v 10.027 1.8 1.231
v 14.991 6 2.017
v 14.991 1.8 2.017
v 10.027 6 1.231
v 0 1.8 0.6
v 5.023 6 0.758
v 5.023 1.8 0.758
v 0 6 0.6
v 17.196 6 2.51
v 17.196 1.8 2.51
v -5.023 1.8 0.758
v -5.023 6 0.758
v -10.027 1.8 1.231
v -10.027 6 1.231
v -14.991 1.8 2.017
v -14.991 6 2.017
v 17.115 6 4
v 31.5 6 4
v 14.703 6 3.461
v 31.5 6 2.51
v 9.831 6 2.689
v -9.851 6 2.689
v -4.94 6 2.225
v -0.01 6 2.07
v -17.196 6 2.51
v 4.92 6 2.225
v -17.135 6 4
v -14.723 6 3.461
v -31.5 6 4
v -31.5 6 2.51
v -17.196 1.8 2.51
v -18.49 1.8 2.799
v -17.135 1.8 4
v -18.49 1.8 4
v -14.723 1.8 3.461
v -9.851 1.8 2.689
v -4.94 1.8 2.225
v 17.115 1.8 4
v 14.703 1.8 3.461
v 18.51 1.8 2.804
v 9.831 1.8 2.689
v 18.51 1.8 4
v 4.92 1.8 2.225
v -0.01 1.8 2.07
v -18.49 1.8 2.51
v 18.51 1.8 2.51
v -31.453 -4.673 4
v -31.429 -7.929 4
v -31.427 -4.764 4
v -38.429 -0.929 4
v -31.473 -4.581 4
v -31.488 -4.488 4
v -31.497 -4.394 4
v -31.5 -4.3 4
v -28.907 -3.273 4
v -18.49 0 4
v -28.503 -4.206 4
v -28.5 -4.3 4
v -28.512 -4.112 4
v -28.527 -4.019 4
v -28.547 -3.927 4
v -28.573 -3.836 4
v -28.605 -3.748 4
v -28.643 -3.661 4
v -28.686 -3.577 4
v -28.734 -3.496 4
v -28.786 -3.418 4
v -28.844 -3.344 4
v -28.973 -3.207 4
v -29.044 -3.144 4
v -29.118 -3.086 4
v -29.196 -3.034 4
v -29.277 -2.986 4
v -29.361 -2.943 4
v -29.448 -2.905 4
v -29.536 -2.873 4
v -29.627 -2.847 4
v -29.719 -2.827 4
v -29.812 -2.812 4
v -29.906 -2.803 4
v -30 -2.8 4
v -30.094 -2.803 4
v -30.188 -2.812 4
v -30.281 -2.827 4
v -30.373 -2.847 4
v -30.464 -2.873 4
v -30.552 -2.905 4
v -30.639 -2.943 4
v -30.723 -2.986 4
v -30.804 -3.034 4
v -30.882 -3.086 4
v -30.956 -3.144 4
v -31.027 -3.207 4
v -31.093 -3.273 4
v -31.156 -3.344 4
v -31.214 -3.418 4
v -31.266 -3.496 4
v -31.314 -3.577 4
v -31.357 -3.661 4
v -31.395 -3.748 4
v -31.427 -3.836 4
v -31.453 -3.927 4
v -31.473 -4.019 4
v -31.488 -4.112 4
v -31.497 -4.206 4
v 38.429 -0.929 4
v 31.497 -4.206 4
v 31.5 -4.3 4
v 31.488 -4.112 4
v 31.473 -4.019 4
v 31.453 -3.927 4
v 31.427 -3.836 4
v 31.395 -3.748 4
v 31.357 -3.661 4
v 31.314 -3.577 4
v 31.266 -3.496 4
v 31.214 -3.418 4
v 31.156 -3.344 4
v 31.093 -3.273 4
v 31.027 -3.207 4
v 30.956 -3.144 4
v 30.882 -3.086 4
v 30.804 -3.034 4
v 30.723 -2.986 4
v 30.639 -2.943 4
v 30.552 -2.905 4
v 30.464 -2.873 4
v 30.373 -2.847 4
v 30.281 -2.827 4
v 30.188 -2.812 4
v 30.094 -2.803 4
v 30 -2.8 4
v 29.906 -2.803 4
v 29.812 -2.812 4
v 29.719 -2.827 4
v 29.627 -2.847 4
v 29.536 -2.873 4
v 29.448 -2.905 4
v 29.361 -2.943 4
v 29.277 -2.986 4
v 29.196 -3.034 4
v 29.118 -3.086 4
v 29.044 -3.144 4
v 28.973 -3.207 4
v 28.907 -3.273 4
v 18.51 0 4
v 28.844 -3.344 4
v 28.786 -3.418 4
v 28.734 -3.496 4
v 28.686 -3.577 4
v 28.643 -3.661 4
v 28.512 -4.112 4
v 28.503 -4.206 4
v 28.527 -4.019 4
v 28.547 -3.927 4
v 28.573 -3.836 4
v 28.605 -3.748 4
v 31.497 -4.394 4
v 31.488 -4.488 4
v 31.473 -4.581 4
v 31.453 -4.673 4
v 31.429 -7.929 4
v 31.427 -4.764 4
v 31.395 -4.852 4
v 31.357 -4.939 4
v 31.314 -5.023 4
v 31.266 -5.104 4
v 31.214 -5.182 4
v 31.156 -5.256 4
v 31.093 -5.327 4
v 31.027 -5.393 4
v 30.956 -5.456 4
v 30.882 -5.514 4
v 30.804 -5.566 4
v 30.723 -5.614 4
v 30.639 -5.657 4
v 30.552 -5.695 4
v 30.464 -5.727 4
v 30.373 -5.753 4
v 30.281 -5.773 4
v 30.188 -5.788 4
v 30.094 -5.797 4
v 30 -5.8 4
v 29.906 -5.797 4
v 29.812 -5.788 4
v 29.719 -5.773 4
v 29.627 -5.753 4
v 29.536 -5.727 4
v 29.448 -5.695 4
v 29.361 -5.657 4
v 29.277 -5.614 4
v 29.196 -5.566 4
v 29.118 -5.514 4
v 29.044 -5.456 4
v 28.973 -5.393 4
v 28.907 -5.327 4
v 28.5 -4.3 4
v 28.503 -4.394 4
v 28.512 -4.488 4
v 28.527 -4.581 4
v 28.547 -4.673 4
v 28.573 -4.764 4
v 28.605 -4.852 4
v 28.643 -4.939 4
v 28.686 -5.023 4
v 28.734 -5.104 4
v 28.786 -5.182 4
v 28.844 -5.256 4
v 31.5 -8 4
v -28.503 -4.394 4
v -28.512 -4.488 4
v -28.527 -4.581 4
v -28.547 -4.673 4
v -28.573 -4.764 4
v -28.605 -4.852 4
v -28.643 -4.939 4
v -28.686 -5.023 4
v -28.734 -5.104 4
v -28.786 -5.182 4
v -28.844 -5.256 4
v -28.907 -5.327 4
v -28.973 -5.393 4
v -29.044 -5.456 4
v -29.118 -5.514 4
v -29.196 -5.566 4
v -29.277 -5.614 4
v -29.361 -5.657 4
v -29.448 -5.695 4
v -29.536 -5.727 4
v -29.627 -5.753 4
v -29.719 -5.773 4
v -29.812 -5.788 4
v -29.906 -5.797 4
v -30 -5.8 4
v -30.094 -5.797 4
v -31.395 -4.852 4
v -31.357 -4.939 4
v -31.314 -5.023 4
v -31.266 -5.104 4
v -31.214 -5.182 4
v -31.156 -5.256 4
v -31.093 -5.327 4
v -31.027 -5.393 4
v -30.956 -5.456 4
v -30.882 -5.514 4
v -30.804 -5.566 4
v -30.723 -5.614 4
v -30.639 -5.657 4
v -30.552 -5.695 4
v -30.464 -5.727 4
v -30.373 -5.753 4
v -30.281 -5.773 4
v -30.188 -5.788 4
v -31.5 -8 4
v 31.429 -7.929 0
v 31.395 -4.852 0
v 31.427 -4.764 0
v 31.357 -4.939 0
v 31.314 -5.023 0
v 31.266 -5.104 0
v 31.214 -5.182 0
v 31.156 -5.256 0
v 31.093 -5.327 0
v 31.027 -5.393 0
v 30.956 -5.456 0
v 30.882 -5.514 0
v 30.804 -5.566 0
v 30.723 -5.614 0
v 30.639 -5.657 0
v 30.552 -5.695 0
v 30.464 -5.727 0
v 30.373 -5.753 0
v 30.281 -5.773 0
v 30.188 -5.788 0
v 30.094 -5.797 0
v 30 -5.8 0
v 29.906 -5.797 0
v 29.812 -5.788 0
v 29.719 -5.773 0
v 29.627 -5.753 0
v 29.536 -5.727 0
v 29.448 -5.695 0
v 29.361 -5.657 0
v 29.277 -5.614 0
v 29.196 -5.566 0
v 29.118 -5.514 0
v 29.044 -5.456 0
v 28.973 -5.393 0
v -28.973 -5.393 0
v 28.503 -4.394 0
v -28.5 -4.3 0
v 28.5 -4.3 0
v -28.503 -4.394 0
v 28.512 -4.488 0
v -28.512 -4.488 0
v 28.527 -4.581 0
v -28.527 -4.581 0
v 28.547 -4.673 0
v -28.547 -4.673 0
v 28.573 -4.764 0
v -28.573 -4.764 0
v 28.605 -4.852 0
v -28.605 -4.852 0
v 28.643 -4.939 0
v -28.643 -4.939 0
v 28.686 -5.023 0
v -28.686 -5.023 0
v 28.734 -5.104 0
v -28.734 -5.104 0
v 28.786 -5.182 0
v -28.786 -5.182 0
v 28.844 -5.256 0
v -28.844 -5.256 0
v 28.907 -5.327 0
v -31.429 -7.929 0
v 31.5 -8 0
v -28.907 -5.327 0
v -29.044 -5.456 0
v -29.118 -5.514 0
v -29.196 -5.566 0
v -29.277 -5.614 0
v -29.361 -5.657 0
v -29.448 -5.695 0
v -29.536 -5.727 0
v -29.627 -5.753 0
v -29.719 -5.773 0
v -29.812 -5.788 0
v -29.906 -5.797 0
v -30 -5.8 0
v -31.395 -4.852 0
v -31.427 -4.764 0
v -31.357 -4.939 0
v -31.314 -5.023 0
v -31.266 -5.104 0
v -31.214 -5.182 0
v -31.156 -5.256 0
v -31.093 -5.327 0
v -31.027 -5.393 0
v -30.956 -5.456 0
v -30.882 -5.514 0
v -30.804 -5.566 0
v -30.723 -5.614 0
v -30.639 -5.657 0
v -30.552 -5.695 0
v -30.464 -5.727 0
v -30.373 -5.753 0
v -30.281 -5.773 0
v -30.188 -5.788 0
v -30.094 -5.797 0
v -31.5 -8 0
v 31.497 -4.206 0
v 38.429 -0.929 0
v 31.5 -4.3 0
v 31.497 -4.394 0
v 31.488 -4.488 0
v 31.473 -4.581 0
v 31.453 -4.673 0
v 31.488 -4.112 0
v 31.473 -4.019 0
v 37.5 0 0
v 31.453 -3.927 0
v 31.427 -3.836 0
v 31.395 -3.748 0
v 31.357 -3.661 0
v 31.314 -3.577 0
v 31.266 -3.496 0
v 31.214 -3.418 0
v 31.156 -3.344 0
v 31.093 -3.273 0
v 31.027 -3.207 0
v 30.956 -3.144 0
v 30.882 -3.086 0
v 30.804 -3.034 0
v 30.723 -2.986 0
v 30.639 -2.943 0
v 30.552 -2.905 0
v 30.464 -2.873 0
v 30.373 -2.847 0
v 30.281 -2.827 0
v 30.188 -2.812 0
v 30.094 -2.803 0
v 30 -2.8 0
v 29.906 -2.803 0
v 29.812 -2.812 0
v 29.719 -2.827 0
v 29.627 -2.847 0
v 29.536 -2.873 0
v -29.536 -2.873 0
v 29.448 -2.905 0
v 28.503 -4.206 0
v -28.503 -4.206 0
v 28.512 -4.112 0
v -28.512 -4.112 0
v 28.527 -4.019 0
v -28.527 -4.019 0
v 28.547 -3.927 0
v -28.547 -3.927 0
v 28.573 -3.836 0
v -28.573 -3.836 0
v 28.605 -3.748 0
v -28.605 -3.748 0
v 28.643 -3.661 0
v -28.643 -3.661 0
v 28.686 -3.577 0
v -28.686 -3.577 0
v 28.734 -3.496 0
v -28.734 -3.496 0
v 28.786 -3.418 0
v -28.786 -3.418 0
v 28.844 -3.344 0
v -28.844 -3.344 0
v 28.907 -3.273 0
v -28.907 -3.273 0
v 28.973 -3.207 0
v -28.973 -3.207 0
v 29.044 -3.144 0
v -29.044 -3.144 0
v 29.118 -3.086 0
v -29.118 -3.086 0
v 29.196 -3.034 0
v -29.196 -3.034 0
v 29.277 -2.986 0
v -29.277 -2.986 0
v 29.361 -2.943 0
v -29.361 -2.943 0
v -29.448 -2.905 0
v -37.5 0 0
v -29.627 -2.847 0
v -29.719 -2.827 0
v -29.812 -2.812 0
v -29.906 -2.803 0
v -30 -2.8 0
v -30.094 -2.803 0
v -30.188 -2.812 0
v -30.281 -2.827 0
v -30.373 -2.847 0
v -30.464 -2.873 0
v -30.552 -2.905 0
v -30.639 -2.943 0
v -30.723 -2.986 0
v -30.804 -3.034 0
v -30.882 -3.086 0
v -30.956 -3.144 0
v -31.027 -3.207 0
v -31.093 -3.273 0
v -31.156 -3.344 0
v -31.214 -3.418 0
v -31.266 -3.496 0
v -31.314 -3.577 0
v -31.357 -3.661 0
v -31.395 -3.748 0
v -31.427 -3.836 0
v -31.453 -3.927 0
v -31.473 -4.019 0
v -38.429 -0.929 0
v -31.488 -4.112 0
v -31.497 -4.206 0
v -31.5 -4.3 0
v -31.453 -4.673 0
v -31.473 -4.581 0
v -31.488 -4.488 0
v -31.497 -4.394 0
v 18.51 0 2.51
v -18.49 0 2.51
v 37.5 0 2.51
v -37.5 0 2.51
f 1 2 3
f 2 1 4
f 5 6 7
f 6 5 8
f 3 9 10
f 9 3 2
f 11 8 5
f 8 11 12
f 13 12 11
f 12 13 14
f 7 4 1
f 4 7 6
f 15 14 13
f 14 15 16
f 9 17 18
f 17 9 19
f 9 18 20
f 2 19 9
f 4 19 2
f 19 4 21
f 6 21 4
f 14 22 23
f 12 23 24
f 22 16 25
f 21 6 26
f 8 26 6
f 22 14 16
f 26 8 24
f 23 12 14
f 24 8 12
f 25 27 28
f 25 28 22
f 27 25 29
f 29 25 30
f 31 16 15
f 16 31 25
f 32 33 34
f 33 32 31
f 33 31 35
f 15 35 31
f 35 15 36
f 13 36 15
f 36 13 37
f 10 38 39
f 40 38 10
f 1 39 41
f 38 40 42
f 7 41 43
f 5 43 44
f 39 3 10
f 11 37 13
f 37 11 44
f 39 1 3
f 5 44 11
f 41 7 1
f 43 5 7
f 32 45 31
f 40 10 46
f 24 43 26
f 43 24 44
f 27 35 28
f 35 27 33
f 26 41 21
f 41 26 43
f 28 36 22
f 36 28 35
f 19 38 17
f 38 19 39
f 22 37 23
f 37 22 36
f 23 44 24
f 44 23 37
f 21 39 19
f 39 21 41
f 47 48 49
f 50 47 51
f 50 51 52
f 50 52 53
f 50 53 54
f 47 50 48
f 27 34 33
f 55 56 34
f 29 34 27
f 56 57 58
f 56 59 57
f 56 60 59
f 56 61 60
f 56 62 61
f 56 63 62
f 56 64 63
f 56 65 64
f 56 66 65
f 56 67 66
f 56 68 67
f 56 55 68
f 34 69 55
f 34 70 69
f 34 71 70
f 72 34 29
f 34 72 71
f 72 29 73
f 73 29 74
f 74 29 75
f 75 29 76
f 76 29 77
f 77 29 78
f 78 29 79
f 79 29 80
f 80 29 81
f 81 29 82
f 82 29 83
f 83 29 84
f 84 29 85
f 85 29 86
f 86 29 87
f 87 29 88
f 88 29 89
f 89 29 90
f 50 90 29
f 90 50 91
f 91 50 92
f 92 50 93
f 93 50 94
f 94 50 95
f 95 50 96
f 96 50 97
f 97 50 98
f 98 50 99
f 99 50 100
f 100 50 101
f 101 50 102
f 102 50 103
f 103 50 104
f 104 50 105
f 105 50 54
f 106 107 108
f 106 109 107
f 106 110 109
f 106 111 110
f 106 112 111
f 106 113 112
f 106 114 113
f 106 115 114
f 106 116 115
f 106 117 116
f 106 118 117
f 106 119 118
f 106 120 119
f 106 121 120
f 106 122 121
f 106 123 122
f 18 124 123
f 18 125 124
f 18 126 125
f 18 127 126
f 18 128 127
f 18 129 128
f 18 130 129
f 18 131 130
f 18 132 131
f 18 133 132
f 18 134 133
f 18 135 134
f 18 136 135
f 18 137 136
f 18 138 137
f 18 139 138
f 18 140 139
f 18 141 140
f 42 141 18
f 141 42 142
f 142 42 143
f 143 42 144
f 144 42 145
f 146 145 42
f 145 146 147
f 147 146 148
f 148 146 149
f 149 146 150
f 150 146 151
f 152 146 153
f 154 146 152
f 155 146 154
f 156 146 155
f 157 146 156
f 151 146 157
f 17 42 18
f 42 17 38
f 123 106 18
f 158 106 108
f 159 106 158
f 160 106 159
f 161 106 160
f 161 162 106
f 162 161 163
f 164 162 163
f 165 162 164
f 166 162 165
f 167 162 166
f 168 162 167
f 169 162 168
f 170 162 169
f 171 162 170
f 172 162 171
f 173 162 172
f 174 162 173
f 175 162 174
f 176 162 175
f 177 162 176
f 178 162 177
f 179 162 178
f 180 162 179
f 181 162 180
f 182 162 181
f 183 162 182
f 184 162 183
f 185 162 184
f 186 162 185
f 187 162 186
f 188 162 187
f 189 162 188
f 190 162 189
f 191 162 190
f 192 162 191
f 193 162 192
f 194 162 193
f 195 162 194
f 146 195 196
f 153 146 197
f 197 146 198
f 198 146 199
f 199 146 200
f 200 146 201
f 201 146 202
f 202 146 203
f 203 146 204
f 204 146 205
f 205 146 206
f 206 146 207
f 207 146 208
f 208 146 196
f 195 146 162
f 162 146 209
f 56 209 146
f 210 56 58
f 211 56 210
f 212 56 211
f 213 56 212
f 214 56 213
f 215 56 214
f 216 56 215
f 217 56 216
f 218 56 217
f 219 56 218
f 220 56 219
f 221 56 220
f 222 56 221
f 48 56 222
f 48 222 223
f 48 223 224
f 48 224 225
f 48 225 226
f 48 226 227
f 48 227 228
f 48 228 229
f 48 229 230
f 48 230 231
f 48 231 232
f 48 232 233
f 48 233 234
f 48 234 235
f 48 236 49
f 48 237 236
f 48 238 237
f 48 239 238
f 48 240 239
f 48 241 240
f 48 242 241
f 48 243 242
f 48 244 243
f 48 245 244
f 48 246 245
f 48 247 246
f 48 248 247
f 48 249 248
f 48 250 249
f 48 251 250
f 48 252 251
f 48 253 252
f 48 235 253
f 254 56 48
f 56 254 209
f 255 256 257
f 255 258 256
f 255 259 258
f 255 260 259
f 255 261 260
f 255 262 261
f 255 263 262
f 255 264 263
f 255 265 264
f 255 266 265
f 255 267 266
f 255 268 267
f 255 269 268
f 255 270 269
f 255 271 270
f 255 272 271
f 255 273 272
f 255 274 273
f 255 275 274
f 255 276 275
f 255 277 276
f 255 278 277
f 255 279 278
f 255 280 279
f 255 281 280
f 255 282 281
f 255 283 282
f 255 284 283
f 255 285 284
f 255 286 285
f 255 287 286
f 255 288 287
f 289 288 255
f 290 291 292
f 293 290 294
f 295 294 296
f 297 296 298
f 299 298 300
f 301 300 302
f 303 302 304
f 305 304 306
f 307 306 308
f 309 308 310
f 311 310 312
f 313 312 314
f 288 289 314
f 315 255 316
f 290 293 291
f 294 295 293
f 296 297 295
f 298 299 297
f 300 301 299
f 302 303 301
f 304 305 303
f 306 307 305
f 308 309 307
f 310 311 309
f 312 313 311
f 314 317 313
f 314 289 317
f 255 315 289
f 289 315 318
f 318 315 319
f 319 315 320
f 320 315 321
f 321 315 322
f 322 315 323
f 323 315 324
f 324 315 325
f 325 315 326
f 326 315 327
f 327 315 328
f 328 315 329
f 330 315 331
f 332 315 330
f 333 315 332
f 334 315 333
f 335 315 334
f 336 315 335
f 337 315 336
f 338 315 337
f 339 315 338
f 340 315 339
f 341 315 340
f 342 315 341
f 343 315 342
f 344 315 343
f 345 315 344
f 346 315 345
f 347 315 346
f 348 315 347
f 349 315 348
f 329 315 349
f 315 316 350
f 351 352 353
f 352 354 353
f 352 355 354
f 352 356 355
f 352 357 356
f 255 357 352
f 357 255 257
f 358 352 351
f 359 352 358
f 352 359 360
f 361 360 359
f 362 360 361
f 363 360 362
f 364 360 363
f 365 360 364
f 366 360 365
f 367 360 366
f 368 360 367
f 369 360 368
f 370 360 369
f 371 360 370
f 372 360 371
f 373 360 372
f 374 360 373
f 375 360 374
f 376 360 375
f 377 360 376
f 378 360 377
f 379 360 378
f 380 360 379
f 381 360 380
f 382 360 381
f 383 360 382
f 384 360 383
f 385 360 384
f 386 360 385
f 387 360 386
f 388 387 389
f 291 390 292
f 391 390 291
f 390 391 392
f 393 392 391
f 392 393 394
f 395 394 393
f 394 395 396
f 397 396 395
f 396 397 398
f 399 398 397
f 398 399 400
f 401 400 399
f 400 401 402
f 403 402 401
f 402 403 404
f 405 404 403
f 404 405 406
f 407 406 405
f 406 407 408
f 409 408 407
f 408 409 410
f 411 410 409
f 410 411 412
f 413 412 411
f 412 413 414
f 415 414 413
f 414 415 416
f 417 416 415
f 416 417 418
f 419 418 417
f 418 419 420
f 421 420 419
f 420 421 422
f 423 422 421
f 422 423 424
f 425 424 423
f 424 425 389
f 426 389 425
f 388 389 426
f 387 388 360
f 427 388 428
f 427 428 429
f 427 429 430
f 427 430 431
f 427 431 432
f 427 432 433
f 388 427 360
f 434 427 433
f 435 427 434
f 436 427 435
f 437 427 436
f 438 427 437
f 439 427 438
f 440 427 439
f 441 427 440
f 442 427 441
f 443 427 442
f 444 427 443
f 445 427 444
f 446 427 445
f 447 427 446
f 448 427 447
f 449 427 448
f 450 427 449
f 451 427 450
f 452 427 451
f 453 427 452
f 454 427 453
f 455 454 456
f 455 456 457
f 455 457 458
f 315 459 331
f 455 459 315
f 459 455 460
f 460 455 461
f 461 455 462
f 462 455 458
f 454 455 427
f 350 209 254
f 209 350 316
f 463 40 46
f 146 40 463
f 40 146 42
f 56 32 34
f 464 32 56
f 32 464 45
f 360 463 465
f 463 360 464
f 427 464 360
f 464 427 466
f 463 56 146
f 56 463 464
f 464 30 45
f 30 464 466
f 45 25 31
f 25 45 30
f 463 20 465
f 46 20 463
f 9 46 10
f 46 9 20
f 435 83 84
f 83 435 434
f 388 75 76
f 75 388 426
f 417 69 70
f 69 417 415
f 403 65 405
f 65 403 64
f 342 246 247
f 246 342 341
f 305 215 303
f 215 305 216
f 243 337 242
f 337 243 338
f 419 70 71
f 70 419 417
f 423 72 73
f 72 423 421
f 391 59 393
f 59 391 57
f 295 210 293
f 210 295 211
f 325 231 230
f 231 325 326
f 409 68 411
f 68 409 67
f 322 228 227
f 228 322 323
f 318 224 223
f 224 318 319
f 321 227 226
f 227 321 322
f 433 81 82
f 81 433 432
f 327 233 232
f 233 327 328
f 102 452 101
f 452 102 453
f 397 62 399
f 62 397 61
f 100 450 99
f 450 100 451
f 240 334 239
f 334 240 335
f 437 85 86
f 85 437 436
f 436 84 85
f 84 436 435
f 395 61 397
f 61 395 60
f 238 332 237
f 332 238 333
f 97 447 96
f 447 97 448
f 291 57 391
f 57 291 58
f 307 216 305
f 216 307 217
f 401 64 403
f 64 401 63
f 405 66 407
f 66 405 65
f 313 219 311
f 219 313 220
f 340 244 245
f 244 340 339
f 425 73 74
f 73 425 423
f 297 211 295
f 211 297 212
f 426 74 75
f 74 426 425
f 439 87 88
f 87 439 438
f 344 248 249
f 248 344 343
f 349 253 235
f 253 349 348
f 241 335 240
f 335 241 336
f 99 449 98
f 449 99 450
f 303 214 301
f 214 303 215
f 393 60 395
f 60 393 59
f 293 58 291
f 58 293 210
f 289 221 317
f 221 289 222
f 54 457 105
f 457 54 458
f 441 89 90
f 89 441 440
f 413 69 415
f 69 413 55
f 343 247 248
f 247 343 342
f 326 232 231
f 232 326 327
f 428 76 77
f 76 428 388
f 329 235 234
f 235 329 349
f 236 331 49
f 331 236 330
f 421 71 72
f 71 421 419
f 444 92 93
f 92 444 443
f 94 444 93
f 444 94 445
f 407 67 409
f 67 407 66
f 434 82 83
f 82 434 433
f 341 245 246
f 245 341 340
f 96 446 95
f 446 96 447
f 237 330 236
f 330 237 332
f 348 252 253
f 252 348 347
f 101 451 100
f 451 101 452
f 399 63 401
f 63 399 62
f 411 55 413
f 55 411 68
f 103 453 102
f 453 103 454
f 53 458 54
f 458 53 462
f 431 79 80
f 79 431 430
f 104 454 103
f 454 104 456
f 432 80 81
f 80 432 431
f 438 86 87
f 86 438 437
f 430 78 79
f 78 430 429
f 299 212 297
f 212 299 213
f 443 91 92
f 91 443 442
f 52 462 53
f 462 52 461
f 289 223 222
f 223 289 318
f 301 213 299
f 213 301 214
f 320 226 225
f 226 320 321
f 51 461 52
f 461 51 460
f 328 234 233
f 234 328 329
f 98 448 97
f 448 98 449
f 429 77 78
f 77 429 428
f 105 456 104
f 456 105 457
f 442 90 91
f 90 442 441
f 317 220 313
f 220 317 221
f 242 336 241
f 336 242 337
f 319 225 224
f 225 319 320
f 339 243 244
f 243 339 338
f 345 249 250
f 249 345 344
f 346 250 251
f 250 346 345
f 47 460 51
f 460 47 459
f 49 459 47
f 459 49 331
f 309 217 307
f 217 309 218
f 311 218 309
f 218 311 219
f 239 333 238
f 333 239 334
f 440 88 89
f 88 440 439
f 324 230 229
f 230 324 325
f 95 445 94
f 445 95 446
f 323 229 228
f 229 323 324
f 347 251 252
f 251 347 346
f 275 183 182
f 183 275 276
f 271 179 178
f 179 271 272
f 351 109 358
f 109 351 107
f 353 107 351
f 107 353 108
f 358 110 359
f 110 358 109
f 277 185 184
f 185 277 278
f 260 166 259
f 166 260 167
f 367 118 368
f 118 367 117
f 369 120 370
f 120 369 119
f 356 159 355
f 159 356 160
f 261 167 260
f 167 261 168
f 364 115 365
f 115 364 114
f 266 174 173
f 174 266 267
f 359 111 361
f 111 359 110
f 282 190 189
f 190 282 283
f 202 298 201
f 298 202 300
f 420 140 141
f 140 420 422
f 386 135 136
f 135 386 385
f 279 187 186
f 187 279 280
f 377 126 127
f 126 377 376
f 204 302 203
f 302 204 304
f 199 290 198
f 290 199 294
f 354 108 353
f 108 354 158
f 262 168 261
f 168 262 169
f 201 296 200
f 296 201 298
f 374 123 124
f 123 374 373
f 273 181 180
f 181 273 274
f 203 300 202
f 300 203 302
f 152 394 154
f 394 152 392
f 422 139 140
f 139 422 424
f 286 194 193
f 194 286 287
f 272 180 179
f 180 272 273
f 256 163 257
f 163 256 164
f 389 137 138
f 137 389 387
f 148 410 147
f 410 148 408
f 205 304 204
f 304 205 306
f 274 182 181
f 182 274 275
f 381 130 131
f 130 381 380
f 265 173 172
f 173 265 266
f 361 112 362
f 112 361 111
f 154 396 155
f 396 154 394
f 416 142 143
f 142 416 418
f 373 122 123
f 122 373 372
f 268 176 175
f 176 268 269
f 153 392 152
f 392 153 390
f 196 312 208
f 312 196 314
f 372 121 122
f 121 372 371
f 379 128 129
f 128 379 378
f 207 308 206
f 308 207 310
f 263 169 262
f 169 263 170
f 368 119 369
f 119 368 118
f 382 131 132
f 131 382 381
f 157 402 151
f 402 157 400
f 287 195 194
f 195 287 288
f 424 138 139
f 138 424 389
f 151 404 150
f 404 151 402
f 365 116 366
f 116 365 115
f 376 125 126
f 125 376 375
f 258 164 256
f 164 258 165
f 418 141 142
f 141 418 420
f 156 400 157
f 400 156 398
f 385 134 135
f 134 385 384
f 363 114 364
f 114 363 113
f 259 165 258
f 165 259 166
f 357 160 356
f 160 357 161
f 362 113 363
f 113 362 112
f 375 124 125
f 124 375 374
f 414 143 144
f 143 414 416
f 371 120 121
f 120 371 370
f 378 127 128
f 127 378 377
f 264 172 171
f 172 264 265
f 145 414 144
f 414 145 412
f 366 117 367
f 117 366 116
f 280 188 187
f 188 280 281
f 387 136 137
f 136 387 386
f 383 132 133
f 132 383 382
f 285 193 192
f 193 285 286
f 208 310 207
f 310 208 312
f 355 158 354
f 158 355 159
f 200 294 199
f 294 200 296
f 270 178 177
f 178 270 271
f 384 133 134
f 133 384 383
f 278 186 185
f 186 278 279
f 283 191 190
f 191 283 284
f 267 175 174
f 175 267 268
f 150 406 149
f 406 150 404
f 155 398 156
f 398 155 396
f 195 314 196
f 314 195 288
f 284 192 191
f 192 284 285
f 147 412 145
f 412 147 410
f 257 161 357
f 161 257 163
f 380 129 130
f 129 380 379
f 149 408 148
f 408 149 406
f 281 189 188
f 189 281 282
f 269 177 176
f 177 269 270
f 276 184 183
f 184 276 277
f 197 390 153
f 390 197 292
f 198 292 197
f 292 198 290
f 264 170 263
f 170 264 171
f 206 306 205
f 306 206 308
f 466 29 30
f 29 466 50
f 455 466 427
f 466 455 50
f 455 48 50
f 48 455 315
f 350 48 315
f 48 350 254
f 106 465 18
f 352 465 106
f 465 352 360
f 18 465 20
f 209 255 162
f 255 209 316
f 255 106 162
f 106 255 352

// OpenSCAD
//
// Filter Slot for Formatt Hitech 67mm Filter
// Copyright (C) 2021 Uwe Glässner
//

// slot lengths (mm)
l = 77; // total length
l1 = 20;  // length until curve 
// slot widths (mm)
w1 = 8;
w2 = 1.8;
w3 = 4.2;
w  = w1+w2+w3;
// slot height (mm)
h1 = 1.5; // curvature thickness
cr = 80; // curvature radius
of = 0.6; // curvature offset for 2mm firecrest filters (instead of 1.4mm Resin) 
h = 4; // total height

D = 0.01; // generic overlap of parts.

module loch(posx,posy){
    union(){
       translate([posx, posy,-D]) cylinder(d=3, h=h+2*D, $fn=100);
    }
}

intersection(){
    translate([-l/2,-w1,0]) cube([l,w,h]);
    difference(){
       translate([0,w3+w2,cr+of]) rotate ([90,90,0]) cylinder(r=cr,h=w3, $fn=100);
       translate([-D,w3+w2+D,cr+of-D]) rotate ([90,90,0]) cylinder(r=cr-h1+2*D,h=w3+2*D, $fn=100);
    }
}

 difference(){
    // slot
    translate([-l/2,-w1,0]) cube([l,w,h]);
    // carve out middle slot 
    translate([-l/2+l1+D,0,-D]) cube([l-2*l1,w2,h+2*D]);
    // carve out sides
    translate([-l/2-D,0,-D]) cube([l+2*D,w2+w3+D,h-h1+2*D]);
    // carve out curvature
    translate([-D,w3+w2+D,cr+of-D]) rotate ([90,90,0]) cylinder(r=cr-h1+2*D,h=w3+2*D, $fn=100);
     
    // screw holes
    loch(-l/2+8.5, -8+3.7); 
    loch( l/2-8.5, -8+3.7); 
     
    // remove corners 
    translate([-l/2,-1,-D]) rotate([0,0,45]) cube([10,10,h+2*D]);
    translate([-l/2,-15,-D]) rotate([0,0,45]) cube([10,10,h+2*D]);
    translate([l/2,-1,-D]) rotate([0,0,45]) cube([10,10,h+2*D]);
    translate([l/2,-15,-D]) rotate([0,0,45]) cube([10,10,h+2*D]);
}
